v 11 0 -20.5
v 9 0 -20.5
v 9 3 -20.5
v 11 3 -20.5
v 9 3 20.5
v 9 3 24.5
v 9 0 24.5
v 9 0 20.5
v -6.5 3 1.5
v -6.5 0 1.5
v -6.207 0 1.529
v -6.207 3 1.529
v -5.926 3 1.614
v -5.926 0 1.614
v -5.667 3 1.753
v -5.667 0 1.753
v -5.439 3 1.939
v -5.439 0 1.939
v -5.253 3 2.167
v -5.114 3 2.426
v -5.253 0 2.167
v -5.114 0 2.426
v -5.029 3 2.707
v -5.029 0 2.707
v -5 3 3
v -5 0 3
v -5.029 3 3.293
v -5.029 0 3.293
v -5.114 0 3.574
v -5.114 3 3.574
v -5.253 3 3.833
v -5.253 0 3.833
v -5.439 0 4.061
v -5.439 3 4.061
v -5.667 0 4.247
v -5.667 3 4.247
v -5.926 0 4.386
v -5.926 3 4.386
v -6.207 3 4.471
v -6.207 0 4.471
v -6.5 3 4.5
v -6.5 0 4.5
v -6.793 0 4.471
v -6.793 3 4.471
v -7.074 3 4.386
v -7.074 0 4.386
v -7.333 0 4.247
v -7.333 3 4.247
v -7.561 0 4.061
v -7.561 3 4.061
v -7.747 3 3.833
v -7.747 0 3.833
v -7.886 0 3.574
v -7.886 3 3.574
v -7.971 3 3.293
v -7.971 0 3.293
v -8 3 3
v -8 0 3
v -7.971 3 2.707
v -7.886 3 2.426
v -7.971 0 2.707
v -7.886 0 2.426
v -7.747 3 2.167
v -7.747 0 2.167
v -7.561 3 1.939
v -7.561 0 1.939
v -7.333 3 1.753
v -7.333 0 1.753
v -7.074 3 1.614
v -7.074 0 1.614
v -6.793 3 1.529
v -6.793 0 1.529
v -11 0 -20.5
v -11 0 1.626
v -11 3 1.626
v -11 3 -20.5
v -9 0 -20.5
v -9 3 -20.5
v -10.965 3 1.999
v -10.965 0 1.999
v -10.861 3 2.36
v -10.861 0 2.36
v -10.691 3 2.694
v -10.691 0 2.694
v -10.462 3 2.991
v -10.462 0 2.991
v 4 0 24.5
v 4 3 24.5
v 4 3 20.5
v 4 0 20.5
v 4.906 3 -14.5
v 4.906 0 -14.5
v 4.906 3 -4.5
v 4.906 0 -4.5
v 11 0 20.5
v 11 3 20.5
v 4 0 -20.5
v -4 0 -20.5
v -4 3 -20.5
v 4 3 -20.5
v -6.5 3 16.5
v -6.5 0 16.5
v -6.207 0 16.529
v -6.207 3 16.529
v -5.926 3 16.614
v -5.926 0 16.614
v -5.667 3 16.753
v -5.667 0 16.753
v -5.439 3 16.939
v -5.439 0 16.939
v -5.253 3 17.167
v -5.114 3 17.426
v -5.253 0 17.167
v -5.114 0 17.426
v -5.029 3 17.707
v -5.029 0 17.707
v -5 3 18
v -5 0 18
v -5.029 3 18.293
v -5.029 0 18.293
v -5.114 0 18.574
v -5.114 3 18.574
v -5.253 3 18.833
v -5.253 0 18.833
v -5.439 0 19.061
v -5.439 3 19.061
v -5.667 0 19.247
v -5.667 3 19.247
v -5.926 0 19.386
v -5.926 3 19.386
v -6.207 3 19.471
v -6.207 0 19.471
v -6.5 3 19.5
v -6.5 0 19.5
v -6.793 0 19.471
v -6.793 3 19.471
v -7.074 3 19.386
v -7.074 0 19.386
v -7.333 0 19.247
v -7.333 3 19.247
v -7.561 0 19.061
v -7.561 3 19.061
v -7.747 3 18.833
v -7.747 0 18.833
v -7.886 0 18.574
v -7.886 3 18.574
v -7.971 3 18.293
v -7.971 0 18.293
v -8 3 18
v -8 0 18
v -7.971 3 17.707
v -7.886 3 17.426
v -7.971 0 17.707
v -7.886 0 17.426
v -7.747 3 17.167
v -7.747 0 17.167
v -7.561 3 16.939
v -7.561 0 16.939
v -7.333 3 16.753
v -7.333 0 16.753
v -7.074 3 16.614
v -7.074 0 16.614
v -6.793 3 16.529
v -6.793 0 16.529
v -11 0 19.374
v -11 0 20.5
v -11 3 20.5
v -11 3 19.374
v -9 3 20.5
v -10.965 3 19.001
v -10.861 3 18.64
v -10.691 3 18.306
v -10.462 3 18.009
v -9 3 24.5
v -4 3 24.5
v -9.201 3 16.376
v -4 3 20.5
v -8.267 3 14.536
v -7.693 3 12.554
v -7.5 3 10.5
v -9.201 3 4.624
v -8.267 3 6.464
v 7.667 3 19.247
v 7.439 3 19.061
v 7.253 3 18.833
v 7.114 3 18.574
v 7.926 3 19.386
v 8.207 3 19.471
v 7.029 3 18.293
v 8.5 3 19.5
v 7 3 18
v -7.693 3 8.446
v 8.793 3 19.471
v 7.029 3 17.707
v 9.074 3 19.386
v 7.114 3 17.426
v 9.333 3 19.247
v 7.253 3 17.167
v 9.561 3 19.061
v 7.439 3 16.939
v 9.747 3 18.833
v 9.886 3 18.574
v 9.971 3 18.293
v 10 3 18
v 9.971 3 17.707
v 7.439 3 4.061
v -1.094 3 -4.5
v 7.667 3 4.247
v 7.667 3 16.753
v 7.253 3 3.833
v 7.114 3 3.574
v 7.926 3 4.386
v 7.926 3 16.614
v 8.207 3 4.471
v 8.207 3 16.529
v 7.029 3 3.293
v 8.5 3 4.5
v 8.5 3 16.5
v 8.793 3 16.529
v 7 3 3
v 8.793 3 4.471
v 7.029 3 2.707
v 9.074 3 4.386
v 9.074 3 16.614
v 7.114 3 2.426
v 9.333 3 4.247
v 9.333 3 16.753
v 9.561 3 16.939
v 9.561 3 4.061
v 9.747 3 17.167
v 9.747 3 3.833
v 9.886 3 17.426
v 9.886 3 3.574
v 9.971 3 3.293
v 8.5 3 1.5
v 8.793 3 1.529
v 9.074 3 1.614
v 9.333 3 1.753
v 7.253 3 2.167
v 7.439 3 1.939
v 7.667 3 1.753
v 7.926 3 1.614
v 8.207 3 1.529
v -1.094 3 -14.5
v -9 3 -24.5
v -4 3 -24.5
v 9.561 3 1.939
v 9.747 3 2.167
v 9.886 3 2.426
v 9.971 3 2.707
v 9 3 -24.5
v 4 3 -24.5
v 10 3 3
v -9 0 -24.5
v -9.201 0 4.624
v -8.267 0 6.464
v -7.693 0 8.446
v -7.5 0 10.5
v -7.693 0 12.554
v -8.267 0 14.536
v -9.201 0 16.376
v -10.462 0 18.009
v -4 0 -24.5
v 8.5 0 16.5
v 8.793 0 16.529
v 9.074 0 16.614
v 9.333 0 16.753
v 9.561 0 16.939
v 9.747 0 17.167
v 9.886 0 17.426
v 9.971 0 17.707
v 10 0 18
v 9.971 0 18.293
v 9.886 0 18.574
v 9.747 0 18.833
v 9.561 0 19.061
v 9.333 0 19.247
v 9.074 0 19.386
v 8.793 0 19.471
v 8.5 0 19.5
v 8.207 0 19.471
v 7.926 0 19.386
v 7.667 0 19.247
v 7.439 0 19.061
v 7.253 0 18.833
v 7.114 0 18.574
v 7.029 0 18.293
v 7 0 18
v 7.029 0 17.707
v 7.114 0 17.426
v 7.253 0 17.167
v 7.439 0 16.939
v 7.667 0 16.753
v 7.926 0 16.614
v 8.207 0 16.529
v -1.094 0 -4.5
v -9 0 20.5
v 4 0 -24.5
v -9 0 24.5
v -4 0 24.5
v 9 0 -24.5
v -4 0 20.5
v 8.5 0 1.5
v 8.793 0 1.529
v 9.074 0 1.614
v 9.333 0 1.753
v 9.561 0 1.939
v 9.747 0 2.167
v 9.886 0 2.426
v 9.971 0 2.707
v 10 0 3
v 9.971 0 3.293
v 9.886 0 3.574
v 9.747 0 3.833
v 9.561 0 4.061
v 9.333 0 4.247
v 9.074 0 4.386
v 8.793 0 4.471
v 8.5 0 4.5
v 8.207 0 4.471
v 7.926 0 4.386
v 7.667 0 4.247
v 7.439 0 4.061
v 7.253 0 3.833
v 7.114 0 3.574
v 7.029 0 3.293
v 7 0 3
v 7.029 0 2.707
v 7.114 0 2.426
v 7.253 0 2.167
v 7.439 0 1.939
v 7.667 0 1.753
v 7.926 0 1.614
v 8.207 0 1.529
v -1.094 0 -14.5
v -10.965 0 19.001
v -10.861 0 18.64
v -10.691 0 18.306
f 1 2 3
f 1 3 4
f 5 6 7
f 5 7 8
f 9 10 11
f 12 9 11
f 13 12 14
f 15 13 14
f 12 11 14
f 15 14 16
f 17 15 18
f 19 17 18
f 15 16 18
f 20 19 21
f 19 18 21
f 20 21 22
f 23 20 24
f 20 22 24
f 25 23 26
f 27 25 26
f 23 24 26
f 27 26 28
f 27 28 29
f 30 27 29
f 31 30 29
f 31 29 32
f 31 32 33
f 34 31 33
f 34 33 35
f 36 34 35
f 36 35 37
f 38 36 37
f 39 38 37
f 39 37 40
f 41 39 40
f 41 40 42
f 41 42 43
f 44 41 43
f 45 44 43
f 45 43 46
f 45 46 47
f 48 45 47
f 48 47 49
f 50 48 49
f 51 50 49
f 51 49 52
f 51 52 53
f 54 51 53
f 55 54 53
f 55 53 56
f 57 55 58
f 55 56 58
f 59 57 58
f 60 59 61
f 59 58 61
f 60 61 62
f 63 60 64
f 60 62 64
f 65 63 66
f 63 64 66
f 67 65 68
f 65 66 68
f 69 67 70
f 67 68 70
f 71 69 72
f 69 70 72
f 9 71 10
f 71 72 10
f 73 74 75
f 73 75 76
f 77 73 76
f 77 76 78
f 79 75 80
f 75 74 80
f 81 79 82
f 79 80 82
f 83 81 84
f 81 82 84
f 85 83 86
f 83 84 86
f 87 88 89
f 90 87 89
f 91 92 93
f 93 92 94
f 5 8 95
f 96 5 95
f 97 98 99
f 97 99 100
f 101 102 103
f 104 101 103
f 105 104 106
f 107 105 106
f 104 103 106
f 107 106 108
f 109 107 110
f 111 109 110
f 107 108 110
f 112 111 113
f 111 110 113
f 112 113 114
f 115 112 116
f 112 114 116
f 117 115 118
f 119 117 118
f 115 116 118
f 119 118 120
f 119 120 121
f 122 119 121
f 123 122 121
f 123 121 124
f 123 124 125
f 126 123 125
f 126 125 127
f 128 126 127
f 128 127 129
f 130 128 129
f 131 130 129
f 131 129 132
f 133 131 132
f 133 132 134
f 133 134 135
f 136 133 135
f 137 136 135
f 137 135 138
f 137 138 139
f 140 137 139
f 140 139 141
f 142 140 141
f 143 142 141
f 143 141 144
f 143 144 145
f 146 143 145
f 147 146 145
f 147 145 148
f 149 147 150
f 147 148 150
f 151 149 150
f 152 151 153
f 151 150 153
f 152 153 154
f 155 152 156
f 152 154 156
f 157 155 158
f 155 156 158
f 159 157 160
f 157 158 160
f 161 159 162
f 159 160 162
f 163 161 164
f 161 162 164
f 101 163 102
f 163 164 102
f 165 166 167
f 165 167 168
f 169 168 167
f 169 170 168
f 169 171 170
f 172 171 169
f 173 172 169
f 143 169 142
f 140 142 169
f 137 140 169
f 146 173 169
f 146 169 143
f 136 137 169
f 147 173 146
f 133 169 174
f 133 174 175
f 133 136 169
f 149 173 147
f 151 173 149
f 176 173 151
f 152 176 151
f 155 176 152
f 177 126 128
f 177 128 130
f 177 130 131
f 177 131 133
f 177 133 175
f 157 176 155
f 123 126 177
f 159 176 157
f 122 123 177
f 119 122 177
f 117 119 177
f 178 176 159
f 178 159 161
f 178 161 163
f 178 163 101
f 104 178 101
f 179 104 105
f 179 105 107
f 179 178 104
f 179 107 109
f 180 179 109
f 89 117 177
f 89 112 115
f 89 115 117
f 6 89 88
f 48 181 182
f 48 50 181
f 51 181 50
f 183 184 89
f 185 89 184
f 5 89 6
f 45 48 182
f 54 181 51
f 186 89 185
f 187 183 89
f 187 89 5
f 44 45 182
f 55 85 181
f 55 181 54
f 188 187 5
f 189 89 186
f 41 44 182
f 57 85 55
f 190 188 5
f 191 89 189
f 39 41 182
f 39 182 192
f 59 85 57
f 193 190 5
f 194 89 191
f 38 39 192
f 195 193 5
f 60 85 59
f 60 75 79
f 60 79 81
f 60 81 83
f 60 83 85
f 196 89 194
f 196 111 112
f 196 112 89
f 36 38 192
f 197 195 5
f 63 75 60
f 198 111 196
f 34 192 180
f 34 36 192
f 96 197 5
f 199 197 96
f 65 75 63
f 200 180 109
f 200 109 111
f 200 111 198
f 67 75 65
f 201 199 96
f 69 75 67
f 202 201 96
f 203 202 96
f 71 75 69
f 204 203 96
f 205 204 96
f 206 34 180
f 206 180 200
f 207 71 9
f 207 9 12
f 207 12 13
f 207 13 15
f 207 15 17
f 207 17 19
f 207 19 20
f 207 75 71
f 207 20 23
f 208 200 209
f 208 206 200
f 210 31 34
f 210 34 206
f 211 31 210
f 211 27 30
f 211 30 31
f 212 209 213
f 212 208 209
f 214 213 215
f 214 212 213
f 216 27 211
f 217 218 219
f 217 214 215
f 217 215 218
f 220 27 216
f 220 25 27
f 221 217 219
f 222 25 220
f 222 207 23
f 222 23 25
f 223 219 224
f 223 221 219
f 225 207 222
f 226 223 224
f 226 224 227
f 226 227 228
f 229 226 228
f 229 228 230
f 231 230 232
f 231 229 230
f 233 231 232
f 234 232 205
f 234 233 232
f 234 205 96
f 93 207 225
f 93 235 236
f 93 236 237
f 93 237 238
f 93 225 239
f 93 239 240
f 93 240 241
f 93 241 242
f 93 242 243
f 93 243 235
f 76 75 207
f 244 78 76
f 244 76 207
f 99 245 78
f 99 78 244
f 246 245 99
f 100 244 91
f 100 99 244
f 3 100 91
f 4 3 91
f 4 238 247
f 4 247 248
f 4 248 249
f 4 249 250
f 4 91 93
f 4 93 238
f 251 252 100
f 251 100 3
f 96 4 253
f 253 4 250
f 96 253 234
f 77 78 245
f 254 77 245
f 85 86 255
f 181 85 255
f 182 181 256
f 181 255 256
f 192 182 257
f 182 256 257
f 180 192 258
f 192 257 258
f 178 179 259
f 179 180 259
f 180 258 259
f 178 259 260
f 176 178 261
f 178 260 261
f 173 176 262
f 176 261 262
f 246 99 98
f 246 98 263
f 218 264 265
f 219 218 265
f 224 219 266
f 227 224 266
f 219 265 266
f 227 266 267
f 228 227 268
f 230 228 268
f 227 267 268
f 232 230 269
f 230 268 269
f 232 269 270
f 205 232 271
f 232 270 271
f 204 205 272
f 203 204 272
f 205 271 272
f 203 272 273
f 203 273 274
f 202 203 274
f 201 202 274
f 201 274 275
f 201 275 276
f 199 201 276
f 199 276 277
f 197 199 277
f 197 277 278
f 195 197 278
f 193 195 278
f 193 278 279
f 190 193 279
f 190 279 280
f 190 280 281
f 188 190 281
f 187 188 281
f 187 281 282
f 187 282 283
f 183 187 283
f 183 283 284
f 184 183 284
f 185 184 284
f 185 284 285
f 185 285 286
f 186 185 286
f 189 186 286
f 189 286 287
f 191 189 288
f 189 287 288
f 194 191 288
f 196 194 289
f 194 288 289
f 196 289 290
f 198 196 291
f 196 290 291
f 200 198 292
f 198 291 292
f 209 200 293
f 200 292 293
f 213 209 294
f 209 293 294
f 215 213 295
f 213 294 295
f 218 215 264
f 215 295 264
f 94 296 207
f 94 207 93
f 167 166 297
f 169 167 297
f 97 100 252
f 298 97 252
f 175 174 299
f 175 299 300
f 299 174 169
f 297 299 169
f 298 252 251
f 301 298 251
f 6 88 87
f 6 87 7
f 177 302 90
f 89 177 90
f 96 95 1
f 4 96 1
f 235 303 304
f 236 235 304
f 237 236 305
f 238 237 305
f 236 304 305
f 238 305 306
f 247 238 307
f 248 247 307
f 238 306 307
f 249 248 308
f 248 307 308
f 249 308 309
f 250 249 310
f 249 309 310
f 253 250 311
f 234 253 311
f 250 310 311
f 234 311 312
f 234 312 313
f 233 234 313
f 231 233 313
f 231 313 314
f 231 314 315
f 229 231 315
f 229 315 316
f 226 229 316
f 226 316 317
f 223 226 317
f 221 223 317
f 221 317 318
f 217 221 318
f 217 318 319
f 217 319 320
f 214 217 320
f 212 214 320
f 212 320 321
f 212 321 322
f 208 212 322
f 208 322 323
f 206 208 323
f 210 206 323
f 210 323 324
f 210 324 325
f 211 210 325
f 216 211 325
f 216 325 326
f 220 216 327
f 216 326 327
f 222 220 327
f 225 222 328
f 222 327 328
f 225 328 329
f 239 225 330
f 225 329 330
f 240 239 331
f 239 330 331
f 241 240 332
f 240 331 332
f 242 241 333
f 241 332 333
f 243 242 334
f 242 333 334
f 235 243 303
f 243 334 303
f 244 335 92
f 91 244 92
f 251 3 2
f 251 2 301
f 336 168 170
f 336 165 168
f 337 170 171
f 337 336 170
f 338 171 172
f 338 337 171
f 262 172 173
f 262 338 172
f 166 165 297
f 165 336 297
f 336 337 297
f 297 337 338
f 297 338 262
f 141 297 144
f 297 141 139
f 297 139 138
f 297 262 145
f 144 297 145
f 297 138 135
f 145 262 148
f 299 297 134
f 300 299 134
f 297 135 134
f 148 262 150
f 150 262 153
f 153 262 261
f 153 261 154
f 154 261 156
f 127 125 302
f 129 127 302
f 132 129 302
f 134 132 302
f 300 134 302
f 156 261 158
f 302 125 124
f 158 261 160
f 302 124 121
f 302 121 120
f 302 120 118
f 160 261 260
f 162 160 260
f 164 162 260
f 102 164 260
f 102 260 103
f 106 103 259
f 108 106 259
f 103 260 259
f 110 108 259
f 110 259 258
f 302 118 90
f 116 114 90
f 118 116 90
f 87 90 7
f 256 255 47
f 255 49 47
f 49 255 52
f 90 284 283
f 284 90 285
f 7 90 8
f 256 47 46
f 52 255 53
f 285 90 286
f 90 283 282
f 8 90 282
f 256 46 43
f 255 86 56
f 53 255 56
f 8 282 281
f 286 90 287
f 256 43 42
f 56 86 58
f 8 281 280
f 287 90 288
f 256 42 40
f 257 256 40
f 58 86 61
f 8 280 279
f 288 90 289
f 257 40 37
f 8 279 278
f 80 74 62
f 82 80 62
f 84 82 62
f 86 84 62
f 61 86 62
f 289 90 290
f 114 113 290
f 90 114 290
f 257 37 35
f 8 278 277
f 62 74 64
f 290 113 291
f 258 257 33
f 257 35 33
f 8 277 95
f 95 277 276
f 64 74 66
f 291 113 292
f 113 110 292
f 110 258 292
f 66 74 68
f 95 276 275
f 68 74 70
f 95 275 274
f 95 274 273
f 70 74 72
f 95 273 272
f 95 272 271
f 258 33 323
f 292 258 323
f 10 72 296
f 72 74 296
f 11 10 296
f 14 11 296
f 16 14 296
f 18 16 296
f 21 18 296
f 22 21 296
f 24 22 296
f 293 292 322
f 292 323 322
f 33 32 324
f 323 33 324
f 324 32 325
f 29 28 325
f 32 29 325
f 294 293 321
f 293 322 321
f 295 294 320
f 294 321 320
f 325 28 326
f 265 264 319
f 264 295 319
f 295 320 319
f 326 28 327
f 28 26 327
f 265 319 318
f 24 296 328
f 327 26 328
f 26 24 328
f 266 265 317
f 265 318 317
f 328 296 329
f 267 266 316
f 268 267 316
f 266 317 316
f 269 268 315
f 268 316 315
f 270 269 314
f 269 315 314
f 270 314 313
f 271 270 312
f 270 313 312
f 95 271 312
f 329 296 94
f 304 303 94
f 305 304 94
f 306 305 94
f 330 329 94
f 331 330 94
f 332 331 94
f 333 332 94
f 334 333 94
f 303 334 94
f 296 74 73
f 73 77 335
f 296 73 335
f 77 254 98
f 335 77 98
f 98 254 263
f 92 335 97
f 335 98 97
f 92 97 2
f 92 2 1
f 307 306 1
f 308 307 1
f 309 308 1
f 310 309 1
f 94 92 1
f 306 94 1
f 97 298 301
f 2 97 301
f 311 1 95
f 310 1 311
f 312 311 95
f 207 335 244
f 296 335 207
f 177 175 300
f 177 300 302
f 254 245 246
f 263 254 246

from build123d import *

# Parameters (mm, degrees)
SKETCH_1_W          = 22
SKETCH_1_H          = 41
EXTRUDE_1_DEPTH     = 3
SKETCH_2_W          = 5
SKETCH_2_H          = 4
EXTRUDE_2_DEPTH     = 3
SKETCH_3_W          = 6
SKETCH_3_H          = 10
CUT_EXTRUDE_1_DEPTH = 10
SKETCH_4_R          = 1.5
CUT_EXTRUDE_2_DEPTH = 10
SKETCH_5_R          = 11
CUT_EXTRUDE_3_DEPTH = 10
FILLET_1_R          = 2


with BuildPart() as part:
    # 草图1 → 凸台-拉伸1 (new body)
    with BuildSketch(Plane(origin=(0, 0, 0), x_dir=(1, 0, 0), z_dir=(0, 1, 0))):
        Rectangle(SKETCH_1_W, SKETCH_1_H)
    extrude(amount=EXTRUDE_1_DEPTH)

    # 草图2 → 凸台-拉伸2 (add)
    with BuildSketch(Plane(origin=(0, 3, 0), x_dir=(1, 0, 0), z_dir=(0, 1, 0))):
        with Locations((-6.5, 22.5)):
            Rectangle(SKETCH_2_W, SKETCH_2_H)
        with Locations((6.5, 22.5)):
            Rectangle(SKETCH_2_W, SKETCH_2_H)
        with Locations((6.5, -22.5)):
            Rectangle(SKETCH_2_W, SKETCH_2_H)
        with Locations((-6.5, -22.5)):
            Rectangle(SKETCH_2_W, SKETCH_2_H)
    extrude(amount=-EXTRUDE_2_DEPTH)

    # 草图3 → 切除-拉伸1 (cut)
    with BuildSketch(Plane.XZ):
        with Locations((1.906204118, -9.5)):
            Rectangle(SKETCH_3_W, SKETCH_3_H)
    extrude(amount=-CUT_EXTRUDE_1_DEPTH, mode=Mode.SUBTRACT)

    # 草图4 → 切除-拉伸2 (cut)
    with BuildSketch(Plane.XZ):
        with Locations(Location((-6.5, 18, 0), (0, 0, 270))):
            Circle(SKETCH_4_R)
        with Locations(Location((8.5, 18, 0), (0, 0, 270))):
            Circle(SKETCH_4_R)
        with Locations(Location((-6.5, 3, 0), (0, 0, 270))):
            Circle(SKETCH_4_R)
        with Locations(Location((8.5, 3, 0), (0, 0, 270))):
            Circle(SKETCH_4_R)
    extrude(amount=-CUT_EXTRUDE_2_DEPTH, mode=Mode.SUBTRACT)

    # 草图5 → 切除-拉伸3 (cut)
    with BuildSketch(Plane.XZ):
        with Locations((-18.5, 10.5)):
            Circle(SKETCH_5_R)
    extrude(amount=-CUT_EXTRUDE_3_DEPTH, mode=Mode.SUBTRACT)

    # 圆角1
    fillet_1_edges = [part.edges().sort_by_distance(p)[0] for p in [
        (-11, 1.5, 18.54673847),
        (-11, 1.5, 2.45326153),
    ]]
    fillet(fillet_1_edges, radius=FILLET_1_R)


solid = part.part
